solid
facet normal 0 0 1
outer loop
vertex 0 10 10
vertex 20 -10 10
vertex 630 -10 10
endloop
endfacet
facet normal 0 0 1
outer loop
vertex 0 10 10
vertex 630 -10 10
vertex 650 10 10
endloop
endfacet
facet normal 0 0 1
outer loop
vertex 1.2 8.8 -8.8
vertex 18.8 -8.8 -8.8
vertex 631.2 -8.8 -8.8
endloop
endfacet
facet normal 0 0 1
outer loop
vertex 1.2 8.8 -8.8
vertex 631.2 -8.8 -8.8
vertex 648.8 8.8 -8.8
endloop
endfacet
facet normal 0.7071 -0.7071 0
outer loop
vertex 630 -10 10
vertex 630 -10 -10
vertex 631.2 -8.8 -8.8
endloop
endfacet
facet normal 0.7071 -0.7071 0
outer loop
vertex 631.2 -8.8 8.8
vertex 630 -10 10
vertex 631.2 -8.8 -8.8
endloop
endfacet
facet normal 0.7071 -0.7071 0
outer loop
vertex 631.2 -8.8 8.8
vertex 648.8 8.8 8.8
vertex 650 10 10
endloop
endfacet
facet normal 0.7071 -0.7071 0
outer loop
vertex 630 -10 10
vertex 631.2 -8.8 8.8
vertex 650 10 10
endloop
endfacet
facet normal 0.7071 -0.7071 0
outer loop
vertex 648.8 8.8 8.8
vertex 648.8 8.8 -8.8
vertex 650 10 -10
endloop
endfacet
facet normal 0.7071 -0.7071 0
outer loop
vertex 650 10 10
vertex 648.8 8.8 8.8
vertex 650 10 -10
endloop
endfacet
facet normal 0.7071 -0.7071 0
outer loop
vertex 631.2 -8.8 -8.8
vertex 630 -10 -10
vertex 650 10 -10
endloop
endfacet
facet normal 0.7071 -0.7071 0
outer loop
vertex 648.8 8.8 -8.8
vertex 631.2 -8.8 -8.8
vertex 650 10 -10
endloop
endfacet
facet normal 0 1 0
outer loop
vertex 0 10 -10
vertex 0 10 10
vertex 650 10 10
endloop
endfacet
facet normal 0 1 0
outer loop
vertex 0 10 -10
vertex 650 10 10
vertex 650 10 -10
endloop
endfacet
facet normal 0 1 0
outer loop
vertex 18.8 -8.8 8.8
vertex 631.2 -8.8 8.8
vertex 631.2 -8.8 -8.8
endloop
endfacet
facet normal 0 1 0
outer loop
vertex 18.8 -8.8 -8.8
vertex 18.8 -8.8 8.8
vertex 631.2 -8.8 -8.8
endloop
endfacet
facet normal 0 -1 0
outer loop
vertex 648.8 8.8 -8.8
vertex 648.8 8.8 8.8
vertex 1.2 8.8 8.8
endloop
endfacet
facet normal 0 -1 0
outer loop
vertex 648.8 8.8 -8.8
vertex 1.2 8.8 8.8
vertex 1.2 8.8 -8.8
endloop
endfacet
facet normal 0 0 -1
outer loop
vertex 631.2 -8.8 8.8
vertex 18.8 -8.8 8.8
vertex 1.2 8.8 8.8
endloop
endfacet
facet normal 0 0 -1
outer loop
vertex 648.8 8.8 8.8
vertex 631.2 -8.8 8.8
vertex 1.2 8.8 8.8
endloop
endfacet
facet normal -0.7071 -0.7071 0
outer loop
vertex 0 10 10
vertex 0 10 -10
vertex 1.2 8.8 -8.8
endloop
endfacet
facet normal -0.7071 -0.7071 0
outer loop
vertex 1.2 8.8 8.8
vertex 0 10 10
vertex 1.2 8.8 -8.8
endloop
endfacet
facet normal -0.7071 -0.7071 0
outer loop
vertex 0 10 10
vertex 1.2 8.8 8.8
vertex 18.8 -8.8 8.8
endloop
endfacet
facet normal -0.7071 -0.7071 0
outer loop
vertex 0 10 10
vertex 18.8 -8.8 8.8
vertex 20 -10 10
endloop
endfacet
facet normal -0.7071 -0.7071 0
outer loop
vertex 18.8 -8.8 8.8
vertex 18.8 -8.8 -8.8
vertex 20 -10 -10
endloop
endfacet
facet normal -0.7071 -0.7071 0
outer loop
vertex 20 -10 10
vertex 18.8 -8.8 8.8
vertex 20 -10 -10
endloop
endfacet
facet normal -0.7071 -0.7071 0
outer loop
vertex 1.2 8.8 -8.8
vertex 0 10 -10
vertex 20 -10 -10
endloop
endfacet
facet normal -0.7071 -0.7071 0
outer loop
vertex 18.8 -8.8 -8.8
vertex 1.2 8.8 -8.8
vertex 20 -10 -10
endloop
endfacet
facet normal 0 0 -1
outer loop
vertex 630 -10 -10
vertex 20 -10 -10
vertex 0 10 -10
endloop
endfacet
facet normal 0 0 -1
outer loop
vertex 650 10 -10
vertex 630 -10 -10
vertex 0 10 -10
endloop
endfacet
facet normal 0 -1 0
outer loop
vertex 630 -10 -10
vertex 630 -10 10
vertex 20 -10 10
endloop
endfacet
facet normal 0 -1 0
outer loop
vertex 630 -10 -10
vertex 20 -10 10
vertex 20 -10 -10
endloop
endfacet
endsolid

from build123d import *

# Parameters (mm, degrees)
SKETCH1_W               = 20
SKETCH1_H               = 20
SKETCH1_W_2             = 17.6
SKETCH1_H_2             = 17.6
BOSS_EXTRUDE1_DEPTH     = 650
CUT_EXTRUDE1_DEPTH      = 1
CUT_EXTRUDE1_DEPTH_BACK = 21
CUT_EXTRUDE3_DEPTH      = 1
CUT_EXTRUDE3_DEPTH_BACK = 21


with BuildPart() as part:
    # Sketch1 → Boss-Extrude1 (new body)
    with BuildSketch(Plane(origin=(0, 0, 0), x_dir=(0, 0, -1), z_dir=(1, 0, 0))):
        Rectangle(SKETCH1_W, SKETCH1_H)
        Rectangle(SKETCH1_W_2, SKETCH1_H_2, mode=Mode.SUBTRACT)
    extrude(amount=BOSS_EXTRUDE1_DEPTH)

    # Sketch2 → Cut-Extrude1 (cut, two sides)
    with BuildSketch(Plane(origin=(0, 0, -10), x_dir=(-1, 0, 0), z_dir=(0, 0, -1))) as cut_extrude1_sk:
        Polygon((926.744923045, 936.744923045), (0, 10), (-20, -10), (-946.744923045, -936.744923045), (906.744923045, -2790.234769136), (2780.234769136, -916.744923045), align=None)
    extrude(amount=CUT_EXTRUDE1_DEPTH, mode=Mode.SUBTRACT)
    extrude(cut_extrude1_sk.sketch, amount=-CUT_EXTRUDE1_DEPTH_BACK, mode=Mode.SUBTRACT)

    # Sketch3 → Cut-Extrude3 (cut, two sides)
    with BuildSketch(Plane(origin=(0, 0, -10), x_dir=(-1, 0, 0), z_dir=(0, 0, -1))) as cut_extrude3_sk:
        Polygon((-1576.744923045, 936.744923045), (-650, 10), (-630, -10), (296.744923045, -936.744923045), (-1556.744923045, -2790.234769136), (-3430.234769136, -916.744923045), align=None)
    extrude(amount=CUT_EXTRUDE3_DEPTH, mode=Mode.SUBTRACT)
    extrude(cut_extrude3_sk.sketch, amount=-CUT_EXTRUDE3_DEPTH_BACK, mode=Mode.SUBTRACT)


solid = part.part
